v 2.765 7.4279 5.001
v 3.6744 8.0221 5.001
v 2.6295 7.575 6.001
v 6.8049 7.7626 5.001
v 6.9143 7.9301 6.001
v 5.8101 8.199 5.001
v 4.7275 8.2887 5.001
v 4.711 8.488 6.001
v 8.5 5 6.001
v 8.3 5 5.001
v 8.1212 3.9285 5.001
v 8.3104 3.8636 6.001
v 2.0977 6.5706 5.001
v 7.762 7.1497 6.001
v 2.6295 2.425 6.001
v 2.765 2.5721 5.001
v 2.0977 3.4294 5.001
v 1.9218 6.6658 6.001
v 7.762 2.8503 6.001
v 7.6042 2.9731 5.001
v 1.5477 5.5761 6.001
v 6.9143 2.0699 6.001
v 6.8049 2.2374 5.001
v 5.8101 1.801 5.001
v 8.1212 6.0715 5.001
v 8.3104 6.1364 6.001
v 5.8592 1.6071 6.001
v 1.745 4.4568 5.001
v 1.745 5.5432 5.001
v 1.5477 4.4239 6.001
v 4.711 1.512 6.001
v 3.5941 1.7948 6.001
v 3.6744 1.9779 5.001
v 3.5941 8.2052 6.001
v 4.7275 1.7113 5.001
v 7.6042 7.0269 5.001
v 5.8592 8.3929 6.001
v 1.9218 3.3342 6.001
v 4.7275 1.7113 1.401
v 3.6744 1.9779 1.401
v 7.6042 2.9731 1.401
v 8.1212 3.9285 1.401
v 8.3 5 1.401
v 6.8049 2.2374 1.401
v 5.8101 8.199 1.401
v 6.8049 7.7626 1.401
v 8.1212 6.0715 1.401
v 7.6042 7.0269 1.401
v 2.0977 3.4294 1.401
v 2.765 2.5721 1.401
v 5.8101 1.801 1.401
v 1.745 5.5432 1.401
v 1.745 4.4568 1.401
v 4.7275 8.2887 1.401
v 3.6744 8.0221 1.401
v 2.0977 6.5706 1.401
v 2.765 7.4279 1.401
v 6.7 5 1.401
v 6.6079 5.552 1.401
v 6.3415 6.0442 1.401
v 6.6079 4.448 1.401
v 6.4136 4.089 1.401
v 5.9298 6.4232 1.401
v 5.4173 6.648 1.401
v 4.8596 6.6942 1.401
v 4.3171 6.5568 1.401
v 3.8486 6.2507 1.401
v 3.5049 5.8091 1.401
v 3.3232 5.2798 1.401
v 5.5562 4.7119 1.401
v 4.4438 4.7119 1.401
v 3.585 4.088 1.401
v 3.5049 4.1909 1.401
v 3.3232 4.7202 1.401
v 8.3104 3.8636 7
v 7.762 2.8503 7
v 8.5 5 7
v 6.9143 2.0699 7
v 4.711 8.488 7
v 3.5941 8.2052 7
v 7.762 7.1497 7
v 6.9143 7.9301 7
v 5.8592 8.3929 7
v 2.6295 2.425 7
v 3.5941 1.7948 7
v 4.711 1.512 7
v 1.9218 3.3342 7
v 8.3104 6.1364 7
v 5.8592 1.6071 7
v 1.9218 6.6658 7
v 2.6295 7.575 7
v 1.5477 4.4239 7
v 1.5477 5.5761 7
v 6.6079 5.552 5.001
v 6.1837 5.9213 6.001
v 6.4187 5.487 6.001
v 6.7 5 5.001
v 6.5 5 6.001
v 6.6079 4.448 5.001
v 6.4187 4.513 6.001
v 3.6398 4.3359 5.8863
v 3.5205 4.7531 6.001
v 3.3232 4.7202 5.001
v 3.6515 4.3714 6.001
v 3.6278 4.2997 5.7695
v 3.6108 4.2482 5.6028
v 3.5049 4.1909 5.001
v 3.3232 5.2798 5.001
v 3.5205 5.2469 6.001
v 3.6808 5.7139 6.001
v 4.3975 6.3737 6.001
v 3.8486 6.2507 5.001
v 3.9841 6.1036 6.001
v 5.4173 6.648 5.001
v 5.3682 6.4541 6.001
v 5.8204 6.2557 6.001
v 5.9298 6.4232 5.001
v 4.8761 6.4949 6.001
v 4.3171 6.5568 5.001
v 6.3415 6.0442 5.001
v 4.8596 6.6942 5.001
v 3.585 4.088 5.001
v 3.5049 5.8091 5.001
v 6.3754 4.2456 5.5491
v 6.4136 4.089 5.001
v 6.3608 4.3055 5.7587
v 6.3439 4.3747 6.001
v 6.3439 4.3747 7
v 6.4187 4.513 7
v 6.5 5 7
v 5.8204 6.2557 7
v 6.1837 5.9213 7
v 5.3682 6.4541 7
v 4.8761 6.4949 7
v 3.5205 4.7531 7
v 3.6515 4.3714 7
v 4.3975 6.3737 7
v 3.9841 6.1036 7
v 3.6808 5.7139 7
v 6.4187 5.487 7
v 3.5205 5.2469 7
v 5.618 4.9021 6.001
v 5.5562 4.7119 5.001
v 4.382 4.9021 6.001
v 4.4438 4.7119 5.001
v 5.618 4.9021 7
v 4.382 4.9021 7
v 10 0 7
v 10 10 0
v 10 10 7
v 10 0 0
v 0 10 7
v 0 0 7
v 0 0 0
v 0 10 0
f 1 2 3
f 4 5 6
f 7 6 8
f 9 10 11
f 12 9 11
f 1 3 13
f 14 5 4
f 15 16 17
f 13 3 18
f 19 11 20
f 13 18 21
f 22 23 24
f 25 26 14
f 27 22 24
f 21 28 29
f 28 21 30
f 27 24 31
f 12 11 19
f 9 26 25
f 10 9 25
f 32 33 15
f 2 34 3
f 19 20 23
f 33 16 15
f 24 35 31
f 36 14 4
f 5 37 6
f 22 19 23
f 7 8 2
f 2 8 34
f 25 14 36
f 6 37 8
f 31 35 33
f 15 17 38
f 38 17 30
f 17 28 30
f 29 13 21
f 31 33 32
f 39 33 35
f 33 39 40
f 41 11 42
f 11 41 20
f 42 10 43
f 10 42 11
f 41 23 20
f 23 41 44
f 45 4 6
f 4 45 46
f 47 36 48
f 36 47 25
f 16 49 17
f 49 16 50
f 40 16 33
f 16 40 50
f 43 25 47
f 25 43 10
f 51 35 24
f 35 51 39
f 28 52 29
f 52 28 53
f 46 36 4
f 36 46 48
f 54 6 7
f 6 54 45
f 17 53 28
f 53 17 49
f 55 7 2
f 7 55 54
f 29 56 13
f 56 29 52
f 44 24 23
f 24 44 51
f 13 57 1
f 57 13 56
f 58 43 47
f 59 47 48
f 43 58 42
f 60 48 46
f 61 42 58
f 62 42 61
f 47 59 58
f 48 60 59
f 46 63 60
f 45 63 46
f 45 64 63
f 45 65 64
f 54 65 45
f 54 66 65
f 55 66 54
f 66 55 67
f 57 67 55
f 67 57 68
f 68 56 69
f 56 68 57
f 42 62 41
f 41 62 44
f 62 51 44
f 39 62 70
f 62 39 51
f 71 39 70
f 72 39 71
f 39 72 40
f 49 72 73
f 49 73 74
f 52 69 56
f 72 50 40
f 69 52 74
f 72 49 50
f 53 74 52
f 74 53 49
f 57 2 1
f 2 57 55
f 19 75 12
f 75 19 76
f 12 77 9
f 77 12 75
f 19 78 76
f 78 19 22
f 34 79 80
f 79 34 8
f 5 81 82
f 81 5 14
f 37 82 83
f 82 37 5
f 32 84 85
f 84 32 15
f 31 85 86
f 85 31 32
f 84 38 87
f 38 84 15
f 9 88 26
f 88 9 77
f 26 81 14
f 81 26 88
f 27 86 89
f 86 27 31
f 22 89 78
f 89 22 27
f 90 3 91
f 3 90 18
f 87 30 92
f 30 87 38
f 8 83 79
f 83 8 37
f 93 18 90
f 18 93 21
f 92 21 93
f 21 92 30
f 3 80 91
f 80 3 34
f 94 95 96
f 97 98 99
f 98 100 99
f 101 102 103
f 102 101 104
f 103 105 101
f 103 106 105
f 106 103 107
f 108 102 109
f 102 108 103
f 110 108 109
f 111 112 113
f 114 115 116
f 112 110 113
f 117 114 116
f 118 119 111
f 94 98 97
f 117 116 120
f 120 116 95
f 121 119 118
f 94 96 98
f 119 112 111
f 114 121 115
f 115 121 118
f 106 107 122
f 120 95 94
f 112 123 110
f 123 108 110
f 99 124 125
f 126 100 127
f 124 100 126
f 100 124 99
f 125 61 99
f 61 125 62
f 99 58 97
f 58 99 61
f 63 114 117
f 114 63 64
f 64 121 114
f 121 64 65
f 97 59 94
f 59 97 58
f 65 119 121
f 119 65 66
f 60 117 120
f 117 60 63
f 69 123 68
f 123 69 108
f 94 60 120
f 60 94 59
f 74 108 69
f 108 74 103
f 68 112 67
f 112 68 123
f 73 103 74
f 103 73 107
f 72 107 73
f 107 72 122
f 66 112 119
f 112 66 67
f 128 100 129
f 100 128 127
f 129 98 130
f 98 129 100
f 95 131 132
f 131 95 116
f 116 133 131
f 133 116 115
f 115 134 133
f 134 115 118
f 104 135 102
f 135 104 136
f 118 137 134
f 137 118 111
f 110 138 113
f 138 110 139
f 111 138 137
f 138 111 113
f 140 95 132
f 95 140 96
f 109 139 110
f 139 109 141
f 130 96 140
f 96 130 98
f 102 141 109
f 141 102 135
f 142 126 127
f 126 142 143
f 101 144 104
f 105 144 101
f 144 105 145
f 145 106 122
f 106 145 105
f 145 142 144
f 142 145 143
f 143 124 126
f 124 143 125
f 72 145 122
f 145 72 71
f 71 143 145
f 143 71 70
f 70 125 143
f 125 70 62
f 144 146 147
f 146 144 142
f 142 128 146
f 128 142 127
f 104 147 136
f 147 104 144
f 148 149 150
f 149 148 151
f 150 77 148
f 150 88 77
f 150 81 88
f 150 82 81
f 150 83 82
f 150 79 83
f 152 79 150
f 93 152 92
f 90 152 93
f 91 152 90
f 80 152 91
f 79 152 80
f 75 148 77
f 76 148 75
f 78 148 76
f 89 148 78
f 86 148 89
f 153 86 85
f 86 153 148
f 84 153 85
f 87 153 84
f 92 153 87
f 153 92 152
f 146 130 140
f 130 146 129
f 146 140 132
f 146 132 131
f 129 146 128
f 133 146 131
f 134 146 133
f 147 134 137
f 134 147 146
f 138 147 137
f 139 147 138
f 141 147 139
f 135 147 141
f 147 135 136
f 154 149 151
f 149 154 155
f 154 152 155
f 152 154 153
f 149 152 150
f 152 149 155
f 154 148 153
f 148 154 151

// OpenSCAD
// file: constants.scad
connectors_notched_circle_thickness = 2;
connectors_notched_circle_notch_diameter = 3;
connectors_notched_circle_loose_length = 1;
connectors_notched_circle_loose_to_tight_length = 1;
// file: ../../utilities/cylinders.scad
// Calculates the $fn which should be used for a cylinder of a specific size.
function cylinder_sides(
  // The diameter of the cylinder.
  diameter
) = ceil(
  max(
    min(
      360 / $fa,
      diameter * PI / $fs
    ),
    8
  )
);

// Generates a grid of square perforations through a cylinder of a specific
// size.
module cylinder_perforations(
  // The diameter of the cylinder.
  diameter,
  // The height of the cylinder.
  length,
  // The size (width/height) of each perforation.
  perforation_size,
  // The target spacing between perforations.  This will be adjusted to fit
  // evenly on the cylinder.
  perforation_spacing
) {
  half_perimeter = diameter * PI / 2;
  angularPerforations = round(half_perimeter / perforation_spacing);
  zPerforations = round(half_perimeter / perforation_spacing);
  for (angle = [0:180 / angularPerforations:180]) {
    rotate([0, 0, angle]) {
      for (z = [perforation_spacing:perforation_spacing:length - perforation_spacing]) {
        translate([0, 0, z]) {
          cube([diameter, perforation_size, perforation_size], center = true);
        };
      }
    };
  };
};

// Generates a "pipe" which lofts a sequence of circles together.
module cylinder_sequence(
  // The diameter of the first circle.
  initial_diameter,
  // An array of arrays, where each child array is two numbers:
  // - The length of the segment along Z.
  // - The diameter of the end of the segment.
  length_diameter_pairs,
  // The number of sides of all circles drawn.
  sides,
  // Used for recursion; leave as default.
  i = 0
) {
  if (i < len(length_diameter_pairs)) {
    cylinder(
      d1 = initial_diameter,
      d2 = length_diameter_pairs[i][1],
      h = length_diameter_pairs[i][0],
      $fn = sides
    );
    translate([
      0,
      0,
      length_diameter_pairs[i][0]
    ]) {
      cylinder_sequence(
        length_diameter_pairs[i][1],
        length_diameter_pairs,
        sides,
        i + 1
      );
    };
  };
};
// file: female.scad
include <../../settings.scad>;
use <../../utilities/cylinders.scad>;
include <constants.scad>;

// Renders the female counterpart of a circular connector with a number of
// orienting notches.  Place on the surface oriented so that Z- is the surface
// normal.
module connectors_notched_circle_female(
    // The outer diameter of the compatible male circle.
    diameter,
    // The length of the male compatible circle.
    length,
    // The number of notches, spaced evenly.
    notches
) {
  outer_circle_diameter_loose = diameter + loose_tolerance;
  outer_circle_diameter_tight = diameter + tight_tolerance;
  inner_circle_diameter_loose = diameter - connectors_notched_circle_thickness - loose_tolerance;
  inner_circle_diameter_tight = diameter - connectors_notched_circle_thickness - tight_tolerance;
  notch_diameter_loose = connectors_notched_circle_notch_diameter + loose_tolerance;
  notch_diameter_tight = connectors_notched_circle_notch_diameter + tight_tolerance;
  final_circle_length = length + tight_tolerance - connectors_notched_circle_loose_length - connectors_notched_circle_loose_to_tight_length;
  union() {
    difference() {
      // The outer circle.
      cylinder_sequence(
        outer_circle_diameter_loose,
        [
          [
            connectors_notched_circle_loose_length,
            outer_circle_diameter_loose
          ],
          [
            connectors_notched_circle_loose_to_tight_length,
            outer_circle_diameter_tight
          ],
          [
            final_circle_length,
            outer_circle_diameter_tight
          ],
        ],
        cylinder_sides(diameter)
      );

      // The inner circle.
      cylinder_sequence(
        inner_circle_diameter_loose,
        [
          [
            connectors_notched_circle_loose_length,
            inner_circle_diameter_loose
          ],
          [
            connectors_notched_circle_loose_to_tight_length,
            inner_circle_diameter_tight
          ],
          [
            final_circle_length,
            inner_circle_diameter_tight
          ],
        ],
        cylinder_sides(diameter)
      );
    };

    intersection() {
      // The notch.
      for (notch = [0:notches - 1]) {
        rotate([0, 0, notch * 360 / notches]) {
          translate([
            0,
            diameter / 2 - connectors_notched_circle_thickness / 2,
            0
          ]) {
            cylinder_sequence(
              notch_diameter_loose,
              [
                [
                  connectors_notched_circle_loose_length,
                  notch_diameter_loose
                ],
                [
                  connectors_notched_circle_loose_to_tight_length,
                  notch_diameter_tight
                ],
                [
                  final_circle_length,
                  notch_diameter_tight
                ],
              ],
              cylinder_sides(connectors_notched_circle_notch_diameter)
            );
          };
        };
      };

      // Ensure that the notch does not escape the outer circle.
      cylinder_sequence(
        outer_circle_diameter_loose,
        [
          [
            connectors_notched_circle_loose_length,
            outer_circle_diameter_loose
          ],
          [
            connectors_notched_circle_loose_to_tight_length,
            outer_circle_diameter_tight
          ],
          [
            final_circle_length,
            outer_circle_diameter_tight
          ],
        ],
        cylinder_sides(diameter)
      );
    };
  };
};
// file: ../../settings.scad
// When true, lower resolution primitives will be used.
draft = false;

$fs = draft ? 2 : 1;
$fa = draft ? 12 : 6;

// The amount of space left between parts which must fit together tightly.
tight_tolerance = 0.6;

// The amount of space left between parts which must fit together loosely.
loose_tolerance = 1;
// main file
include <../../settings.scad>;
use <female.scad>;

difference() {
  cube([10, 10, 7]);

  translate([5, 5, 7.001]) {
    rotate([180, 0, 0]) {
      connectors_notched_circle_female(6, 5, 1);
    }
  };
};
